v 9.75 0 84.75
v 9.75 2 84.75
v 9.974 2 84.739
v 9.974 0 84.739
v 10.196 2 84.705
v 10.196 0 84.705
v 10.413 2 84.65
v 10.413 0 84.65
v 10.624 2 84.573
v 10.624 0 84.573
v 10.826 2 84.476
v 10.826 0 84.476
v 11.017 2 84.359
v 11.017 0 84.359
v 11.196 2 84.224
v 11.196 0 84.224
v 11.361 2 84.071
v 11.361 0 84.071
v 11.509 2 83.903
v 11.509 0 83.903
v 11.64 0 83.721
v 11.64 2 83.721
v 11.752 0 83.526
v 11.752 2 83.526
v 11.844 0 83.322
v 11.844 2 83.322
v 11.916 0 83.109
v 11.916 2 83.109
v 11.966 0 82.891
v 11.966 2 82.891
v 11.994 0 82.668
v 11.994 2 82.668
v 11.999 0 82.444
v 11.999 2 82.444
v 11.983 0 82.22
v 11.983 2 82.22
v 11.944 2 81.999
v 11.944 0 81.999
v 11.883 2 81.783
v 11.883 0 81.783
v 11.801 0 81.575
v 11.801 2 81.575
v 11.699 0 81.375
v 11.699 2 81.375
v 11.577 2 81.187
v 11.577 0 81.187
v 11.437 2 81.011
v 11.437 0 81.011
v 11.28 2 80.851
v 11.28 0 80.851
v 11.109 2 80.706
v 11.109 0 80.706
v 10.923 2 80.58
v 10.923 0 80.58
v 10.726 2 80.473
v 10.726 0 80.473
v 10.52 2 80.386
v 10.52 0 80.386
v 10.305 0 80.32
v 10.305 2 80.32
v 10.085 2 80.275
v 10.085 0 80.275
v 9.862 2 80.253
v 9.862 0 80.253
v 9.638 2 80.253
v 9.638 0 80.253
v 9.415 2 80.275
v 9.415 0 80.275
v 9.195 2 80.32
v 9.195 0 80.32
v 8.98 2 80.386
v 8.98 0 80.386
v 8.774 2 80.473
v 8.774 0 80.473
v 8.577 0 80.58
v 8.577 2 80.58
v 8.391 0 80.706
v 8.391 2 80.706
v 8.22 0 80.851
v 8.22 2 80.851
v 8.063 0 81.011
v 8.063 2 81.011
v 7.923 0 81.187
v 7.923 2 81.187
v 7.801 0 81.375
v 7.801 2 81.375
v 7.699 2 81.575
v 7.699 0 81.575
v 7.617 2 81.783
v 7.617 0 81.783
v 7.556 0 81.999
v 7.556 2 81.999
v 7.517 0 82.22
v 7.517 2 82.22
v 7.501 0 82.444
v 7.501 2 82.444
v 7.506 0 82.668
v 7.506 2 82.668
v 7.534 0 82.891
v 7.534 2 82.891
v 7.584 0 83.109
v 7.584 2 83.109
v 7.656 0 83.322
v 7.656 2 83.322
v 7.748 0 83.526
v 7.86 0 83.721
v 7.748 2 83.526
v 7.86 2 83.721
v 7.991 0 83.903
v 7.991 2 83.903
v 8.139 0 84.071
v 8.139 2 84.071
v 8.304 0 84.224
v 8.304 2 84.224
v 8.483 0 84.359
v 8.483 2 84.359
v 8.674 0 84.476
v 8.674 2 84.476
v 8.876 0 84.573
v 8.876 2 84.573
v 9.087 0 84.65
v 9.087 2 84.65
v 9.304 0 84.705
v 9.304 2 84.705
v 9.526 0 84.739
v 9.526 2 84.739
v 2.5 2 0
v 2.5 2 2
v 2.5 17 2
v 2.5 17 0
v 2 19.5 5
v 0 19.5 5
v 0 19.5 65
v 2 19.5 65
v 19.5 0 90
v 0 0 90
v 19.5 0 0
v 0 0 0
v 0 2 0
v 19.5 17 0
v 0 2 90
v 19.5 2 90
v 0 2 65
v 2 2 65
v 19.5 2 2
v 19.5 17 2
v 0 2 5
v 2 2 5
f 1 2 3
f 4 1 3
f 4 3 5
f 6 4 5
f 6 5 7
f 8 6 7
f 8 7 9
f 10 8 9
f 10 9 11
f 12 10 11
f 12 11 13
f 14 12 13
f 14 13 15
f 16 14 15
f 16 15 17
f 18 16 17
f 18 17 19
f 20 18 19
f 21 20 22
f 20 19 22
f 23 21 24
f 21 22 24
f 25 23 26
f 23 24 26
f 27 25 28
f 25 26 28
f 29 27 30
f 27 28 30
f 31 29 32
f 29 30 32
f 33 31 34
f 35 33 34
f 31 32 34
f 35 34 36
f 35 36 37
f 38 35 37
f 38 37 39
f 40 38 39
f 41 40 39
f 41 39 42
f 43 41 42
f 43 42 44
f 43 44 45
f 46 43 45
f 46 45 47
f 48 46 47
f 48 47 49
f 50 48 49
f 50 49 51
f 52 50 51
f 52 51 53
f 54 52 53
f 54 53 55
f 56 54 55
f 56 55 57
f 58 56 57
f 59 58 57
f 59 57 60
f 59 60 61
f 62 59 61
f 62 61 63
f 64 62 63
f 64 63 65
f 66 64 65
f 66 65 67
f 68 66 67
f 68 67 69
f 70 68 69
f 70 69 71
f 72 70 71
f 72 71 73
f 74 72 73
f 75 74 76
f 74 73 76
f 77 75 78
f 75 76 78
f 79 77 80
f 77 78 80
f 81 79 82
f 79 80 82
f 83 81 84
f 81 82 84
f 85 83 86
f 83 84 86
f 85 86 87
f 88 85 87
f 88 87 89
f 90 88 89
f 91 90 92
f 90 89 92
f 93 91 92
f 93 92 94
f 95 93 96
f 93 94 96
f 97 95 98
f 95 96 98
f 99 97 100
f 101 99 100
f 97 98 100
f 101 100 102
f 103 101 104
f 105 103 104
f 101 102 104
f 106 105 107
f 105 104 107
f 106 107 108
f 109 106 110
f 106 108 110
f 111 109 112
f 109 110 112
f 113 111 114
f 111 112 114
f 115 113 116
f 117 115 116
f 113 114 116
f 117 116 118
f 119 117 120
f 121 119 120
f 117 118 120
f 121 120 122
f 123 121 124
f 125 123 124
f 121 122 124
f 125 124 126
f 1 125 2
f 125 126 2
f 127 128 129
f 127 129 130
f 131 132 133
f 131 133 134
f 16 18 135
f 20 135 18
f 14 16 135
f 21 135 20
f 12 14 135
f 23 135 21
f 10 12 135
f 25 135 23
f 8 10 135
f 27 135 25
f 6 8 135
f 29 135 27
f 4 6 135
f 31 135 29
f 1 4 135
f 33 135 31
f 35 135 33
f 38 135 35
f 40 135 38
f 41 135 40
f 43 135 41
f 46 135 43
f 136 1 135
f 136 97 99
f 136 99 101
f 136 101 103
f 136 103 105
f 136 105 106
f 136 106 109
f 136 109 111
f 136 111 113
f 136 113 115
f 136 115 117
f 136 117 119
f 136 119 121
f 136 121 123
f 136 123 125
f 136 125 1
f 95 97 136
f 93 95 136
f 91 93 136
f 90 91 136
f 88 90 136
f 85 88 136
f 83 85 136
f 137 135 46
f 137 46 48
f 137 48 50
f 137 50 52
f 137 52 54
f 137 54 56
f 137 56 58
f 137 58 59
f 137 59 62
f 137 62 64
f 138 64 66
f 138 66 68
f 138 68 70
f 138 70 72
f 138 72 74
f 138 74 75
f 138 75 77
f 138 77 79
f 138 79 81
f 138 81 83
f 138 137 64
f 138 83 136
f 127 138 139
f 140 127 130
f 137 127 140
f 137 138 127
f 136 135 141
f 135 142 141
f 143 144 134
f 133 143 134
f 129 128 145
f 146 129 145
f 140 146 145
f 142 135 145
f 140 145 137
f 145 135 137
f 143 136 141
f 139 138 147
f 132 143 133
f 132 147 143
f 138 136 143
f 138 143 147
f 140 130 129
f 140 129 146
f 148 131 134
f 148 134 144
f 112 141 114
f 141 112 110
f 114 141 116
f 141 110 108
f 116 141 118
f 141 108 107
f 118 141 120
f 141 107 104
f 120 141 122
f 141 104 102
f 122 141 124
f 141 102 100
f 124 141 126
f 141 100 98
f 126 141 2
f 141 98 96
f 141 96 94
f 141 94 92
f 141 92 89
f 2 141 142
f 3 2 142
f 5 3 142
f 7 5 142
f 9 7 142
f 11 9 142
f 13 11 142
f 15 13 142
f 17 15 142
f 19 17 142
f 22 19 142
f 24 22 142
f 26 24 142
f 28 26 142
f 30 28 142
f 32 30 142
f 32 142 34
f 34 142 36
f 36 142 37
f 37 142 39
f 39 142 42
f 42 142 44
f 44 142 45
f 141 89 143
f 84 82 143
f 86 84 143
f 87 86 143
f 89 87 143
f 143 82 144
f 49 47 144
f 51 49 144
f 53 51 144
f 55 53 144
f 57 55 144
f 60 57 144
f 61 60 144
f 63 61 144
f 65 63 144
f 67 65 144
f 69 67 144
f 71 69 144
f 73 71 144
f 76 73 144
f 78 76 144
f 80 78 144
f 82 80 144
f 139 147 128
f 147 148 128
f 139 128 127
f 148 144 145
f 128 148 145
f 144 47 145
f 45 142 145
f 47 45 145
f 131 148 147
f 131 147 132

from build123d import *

# Parameters (mm, degrees)
BOSS_EXTRUDE1_DEPTH = 90
SKETCH8_W           = 25
SKETCH8_H           = 17.5
SKETCH8_W_2         = 5
CUT_EXTRUDE1_DEPTH  = 94.736332337
SKETCH2_W           = 17
SKETCH2_H           = 2
BOSS_EXTRUDE2_DEPTH = 15
SKETCH9_R           = 2.25
CUT_EXTRUDE2_DEPTH  = 94.736332337


with BuildPart() as part:
    # Sketch1 → Boss-Extrude1 (new body)
    with BuildSketch(Plane.XY):
        Polygon((0, 0), (0, 19.5), (2, 19.5), (2, 2), (19.5, 2), (19.5, 0), align=None)
    extrude(amount=BOSS_EXTRUDE1_DEPTH)

    # Sketch8 → Cut-Extrude1 (cut, through all)
    with BuildSketch(Plane(origin=(2, 0, 0), x_dir=(0, 0, -1), z_dir=(1, 0, 0))):
        with Locations((-77.5, 10.75)):
            Rectangle(SKETCH8_W, SKETCH8_H)
        with Locations((-2.5, 10.75)):
            Rectangle(SKETCH8_W_2, SKETCH8_H)
    extrude(amount=-CUT_EXTRUDE1_DEPTH, mode=Mode.SUBTRACT)

    # Sketch2 → Boss-Extrude2 (add)
    with BuildSketch(Plane(origin=(0, 2, 0), x_dir=(1, 0, 0), z_dir=(0, 1, 0))):
        with Locations((11, -1)):
            Rectangle(SKETCH2_W, SKETCH2_H)
    extrude(amount=BOSS_EXTRUDE2_DEPTH)

    # Sketch9 → Cut-Extrude2 (cut, through all)
    with BuildSketch(Plane(origin=(0, 2, 0), x_dir=(1, 0, 0), z_dir=(0, 1, 0))):
        with Locations(Location((9.75, -82.5, 0), (0, 0, 270))):
            Circle(SKETCH9_R)
    extrude(amount=-CUT_EXTRUDE2_DEPTH, mode=Mode.SUBTRACT)


solid = part.part
